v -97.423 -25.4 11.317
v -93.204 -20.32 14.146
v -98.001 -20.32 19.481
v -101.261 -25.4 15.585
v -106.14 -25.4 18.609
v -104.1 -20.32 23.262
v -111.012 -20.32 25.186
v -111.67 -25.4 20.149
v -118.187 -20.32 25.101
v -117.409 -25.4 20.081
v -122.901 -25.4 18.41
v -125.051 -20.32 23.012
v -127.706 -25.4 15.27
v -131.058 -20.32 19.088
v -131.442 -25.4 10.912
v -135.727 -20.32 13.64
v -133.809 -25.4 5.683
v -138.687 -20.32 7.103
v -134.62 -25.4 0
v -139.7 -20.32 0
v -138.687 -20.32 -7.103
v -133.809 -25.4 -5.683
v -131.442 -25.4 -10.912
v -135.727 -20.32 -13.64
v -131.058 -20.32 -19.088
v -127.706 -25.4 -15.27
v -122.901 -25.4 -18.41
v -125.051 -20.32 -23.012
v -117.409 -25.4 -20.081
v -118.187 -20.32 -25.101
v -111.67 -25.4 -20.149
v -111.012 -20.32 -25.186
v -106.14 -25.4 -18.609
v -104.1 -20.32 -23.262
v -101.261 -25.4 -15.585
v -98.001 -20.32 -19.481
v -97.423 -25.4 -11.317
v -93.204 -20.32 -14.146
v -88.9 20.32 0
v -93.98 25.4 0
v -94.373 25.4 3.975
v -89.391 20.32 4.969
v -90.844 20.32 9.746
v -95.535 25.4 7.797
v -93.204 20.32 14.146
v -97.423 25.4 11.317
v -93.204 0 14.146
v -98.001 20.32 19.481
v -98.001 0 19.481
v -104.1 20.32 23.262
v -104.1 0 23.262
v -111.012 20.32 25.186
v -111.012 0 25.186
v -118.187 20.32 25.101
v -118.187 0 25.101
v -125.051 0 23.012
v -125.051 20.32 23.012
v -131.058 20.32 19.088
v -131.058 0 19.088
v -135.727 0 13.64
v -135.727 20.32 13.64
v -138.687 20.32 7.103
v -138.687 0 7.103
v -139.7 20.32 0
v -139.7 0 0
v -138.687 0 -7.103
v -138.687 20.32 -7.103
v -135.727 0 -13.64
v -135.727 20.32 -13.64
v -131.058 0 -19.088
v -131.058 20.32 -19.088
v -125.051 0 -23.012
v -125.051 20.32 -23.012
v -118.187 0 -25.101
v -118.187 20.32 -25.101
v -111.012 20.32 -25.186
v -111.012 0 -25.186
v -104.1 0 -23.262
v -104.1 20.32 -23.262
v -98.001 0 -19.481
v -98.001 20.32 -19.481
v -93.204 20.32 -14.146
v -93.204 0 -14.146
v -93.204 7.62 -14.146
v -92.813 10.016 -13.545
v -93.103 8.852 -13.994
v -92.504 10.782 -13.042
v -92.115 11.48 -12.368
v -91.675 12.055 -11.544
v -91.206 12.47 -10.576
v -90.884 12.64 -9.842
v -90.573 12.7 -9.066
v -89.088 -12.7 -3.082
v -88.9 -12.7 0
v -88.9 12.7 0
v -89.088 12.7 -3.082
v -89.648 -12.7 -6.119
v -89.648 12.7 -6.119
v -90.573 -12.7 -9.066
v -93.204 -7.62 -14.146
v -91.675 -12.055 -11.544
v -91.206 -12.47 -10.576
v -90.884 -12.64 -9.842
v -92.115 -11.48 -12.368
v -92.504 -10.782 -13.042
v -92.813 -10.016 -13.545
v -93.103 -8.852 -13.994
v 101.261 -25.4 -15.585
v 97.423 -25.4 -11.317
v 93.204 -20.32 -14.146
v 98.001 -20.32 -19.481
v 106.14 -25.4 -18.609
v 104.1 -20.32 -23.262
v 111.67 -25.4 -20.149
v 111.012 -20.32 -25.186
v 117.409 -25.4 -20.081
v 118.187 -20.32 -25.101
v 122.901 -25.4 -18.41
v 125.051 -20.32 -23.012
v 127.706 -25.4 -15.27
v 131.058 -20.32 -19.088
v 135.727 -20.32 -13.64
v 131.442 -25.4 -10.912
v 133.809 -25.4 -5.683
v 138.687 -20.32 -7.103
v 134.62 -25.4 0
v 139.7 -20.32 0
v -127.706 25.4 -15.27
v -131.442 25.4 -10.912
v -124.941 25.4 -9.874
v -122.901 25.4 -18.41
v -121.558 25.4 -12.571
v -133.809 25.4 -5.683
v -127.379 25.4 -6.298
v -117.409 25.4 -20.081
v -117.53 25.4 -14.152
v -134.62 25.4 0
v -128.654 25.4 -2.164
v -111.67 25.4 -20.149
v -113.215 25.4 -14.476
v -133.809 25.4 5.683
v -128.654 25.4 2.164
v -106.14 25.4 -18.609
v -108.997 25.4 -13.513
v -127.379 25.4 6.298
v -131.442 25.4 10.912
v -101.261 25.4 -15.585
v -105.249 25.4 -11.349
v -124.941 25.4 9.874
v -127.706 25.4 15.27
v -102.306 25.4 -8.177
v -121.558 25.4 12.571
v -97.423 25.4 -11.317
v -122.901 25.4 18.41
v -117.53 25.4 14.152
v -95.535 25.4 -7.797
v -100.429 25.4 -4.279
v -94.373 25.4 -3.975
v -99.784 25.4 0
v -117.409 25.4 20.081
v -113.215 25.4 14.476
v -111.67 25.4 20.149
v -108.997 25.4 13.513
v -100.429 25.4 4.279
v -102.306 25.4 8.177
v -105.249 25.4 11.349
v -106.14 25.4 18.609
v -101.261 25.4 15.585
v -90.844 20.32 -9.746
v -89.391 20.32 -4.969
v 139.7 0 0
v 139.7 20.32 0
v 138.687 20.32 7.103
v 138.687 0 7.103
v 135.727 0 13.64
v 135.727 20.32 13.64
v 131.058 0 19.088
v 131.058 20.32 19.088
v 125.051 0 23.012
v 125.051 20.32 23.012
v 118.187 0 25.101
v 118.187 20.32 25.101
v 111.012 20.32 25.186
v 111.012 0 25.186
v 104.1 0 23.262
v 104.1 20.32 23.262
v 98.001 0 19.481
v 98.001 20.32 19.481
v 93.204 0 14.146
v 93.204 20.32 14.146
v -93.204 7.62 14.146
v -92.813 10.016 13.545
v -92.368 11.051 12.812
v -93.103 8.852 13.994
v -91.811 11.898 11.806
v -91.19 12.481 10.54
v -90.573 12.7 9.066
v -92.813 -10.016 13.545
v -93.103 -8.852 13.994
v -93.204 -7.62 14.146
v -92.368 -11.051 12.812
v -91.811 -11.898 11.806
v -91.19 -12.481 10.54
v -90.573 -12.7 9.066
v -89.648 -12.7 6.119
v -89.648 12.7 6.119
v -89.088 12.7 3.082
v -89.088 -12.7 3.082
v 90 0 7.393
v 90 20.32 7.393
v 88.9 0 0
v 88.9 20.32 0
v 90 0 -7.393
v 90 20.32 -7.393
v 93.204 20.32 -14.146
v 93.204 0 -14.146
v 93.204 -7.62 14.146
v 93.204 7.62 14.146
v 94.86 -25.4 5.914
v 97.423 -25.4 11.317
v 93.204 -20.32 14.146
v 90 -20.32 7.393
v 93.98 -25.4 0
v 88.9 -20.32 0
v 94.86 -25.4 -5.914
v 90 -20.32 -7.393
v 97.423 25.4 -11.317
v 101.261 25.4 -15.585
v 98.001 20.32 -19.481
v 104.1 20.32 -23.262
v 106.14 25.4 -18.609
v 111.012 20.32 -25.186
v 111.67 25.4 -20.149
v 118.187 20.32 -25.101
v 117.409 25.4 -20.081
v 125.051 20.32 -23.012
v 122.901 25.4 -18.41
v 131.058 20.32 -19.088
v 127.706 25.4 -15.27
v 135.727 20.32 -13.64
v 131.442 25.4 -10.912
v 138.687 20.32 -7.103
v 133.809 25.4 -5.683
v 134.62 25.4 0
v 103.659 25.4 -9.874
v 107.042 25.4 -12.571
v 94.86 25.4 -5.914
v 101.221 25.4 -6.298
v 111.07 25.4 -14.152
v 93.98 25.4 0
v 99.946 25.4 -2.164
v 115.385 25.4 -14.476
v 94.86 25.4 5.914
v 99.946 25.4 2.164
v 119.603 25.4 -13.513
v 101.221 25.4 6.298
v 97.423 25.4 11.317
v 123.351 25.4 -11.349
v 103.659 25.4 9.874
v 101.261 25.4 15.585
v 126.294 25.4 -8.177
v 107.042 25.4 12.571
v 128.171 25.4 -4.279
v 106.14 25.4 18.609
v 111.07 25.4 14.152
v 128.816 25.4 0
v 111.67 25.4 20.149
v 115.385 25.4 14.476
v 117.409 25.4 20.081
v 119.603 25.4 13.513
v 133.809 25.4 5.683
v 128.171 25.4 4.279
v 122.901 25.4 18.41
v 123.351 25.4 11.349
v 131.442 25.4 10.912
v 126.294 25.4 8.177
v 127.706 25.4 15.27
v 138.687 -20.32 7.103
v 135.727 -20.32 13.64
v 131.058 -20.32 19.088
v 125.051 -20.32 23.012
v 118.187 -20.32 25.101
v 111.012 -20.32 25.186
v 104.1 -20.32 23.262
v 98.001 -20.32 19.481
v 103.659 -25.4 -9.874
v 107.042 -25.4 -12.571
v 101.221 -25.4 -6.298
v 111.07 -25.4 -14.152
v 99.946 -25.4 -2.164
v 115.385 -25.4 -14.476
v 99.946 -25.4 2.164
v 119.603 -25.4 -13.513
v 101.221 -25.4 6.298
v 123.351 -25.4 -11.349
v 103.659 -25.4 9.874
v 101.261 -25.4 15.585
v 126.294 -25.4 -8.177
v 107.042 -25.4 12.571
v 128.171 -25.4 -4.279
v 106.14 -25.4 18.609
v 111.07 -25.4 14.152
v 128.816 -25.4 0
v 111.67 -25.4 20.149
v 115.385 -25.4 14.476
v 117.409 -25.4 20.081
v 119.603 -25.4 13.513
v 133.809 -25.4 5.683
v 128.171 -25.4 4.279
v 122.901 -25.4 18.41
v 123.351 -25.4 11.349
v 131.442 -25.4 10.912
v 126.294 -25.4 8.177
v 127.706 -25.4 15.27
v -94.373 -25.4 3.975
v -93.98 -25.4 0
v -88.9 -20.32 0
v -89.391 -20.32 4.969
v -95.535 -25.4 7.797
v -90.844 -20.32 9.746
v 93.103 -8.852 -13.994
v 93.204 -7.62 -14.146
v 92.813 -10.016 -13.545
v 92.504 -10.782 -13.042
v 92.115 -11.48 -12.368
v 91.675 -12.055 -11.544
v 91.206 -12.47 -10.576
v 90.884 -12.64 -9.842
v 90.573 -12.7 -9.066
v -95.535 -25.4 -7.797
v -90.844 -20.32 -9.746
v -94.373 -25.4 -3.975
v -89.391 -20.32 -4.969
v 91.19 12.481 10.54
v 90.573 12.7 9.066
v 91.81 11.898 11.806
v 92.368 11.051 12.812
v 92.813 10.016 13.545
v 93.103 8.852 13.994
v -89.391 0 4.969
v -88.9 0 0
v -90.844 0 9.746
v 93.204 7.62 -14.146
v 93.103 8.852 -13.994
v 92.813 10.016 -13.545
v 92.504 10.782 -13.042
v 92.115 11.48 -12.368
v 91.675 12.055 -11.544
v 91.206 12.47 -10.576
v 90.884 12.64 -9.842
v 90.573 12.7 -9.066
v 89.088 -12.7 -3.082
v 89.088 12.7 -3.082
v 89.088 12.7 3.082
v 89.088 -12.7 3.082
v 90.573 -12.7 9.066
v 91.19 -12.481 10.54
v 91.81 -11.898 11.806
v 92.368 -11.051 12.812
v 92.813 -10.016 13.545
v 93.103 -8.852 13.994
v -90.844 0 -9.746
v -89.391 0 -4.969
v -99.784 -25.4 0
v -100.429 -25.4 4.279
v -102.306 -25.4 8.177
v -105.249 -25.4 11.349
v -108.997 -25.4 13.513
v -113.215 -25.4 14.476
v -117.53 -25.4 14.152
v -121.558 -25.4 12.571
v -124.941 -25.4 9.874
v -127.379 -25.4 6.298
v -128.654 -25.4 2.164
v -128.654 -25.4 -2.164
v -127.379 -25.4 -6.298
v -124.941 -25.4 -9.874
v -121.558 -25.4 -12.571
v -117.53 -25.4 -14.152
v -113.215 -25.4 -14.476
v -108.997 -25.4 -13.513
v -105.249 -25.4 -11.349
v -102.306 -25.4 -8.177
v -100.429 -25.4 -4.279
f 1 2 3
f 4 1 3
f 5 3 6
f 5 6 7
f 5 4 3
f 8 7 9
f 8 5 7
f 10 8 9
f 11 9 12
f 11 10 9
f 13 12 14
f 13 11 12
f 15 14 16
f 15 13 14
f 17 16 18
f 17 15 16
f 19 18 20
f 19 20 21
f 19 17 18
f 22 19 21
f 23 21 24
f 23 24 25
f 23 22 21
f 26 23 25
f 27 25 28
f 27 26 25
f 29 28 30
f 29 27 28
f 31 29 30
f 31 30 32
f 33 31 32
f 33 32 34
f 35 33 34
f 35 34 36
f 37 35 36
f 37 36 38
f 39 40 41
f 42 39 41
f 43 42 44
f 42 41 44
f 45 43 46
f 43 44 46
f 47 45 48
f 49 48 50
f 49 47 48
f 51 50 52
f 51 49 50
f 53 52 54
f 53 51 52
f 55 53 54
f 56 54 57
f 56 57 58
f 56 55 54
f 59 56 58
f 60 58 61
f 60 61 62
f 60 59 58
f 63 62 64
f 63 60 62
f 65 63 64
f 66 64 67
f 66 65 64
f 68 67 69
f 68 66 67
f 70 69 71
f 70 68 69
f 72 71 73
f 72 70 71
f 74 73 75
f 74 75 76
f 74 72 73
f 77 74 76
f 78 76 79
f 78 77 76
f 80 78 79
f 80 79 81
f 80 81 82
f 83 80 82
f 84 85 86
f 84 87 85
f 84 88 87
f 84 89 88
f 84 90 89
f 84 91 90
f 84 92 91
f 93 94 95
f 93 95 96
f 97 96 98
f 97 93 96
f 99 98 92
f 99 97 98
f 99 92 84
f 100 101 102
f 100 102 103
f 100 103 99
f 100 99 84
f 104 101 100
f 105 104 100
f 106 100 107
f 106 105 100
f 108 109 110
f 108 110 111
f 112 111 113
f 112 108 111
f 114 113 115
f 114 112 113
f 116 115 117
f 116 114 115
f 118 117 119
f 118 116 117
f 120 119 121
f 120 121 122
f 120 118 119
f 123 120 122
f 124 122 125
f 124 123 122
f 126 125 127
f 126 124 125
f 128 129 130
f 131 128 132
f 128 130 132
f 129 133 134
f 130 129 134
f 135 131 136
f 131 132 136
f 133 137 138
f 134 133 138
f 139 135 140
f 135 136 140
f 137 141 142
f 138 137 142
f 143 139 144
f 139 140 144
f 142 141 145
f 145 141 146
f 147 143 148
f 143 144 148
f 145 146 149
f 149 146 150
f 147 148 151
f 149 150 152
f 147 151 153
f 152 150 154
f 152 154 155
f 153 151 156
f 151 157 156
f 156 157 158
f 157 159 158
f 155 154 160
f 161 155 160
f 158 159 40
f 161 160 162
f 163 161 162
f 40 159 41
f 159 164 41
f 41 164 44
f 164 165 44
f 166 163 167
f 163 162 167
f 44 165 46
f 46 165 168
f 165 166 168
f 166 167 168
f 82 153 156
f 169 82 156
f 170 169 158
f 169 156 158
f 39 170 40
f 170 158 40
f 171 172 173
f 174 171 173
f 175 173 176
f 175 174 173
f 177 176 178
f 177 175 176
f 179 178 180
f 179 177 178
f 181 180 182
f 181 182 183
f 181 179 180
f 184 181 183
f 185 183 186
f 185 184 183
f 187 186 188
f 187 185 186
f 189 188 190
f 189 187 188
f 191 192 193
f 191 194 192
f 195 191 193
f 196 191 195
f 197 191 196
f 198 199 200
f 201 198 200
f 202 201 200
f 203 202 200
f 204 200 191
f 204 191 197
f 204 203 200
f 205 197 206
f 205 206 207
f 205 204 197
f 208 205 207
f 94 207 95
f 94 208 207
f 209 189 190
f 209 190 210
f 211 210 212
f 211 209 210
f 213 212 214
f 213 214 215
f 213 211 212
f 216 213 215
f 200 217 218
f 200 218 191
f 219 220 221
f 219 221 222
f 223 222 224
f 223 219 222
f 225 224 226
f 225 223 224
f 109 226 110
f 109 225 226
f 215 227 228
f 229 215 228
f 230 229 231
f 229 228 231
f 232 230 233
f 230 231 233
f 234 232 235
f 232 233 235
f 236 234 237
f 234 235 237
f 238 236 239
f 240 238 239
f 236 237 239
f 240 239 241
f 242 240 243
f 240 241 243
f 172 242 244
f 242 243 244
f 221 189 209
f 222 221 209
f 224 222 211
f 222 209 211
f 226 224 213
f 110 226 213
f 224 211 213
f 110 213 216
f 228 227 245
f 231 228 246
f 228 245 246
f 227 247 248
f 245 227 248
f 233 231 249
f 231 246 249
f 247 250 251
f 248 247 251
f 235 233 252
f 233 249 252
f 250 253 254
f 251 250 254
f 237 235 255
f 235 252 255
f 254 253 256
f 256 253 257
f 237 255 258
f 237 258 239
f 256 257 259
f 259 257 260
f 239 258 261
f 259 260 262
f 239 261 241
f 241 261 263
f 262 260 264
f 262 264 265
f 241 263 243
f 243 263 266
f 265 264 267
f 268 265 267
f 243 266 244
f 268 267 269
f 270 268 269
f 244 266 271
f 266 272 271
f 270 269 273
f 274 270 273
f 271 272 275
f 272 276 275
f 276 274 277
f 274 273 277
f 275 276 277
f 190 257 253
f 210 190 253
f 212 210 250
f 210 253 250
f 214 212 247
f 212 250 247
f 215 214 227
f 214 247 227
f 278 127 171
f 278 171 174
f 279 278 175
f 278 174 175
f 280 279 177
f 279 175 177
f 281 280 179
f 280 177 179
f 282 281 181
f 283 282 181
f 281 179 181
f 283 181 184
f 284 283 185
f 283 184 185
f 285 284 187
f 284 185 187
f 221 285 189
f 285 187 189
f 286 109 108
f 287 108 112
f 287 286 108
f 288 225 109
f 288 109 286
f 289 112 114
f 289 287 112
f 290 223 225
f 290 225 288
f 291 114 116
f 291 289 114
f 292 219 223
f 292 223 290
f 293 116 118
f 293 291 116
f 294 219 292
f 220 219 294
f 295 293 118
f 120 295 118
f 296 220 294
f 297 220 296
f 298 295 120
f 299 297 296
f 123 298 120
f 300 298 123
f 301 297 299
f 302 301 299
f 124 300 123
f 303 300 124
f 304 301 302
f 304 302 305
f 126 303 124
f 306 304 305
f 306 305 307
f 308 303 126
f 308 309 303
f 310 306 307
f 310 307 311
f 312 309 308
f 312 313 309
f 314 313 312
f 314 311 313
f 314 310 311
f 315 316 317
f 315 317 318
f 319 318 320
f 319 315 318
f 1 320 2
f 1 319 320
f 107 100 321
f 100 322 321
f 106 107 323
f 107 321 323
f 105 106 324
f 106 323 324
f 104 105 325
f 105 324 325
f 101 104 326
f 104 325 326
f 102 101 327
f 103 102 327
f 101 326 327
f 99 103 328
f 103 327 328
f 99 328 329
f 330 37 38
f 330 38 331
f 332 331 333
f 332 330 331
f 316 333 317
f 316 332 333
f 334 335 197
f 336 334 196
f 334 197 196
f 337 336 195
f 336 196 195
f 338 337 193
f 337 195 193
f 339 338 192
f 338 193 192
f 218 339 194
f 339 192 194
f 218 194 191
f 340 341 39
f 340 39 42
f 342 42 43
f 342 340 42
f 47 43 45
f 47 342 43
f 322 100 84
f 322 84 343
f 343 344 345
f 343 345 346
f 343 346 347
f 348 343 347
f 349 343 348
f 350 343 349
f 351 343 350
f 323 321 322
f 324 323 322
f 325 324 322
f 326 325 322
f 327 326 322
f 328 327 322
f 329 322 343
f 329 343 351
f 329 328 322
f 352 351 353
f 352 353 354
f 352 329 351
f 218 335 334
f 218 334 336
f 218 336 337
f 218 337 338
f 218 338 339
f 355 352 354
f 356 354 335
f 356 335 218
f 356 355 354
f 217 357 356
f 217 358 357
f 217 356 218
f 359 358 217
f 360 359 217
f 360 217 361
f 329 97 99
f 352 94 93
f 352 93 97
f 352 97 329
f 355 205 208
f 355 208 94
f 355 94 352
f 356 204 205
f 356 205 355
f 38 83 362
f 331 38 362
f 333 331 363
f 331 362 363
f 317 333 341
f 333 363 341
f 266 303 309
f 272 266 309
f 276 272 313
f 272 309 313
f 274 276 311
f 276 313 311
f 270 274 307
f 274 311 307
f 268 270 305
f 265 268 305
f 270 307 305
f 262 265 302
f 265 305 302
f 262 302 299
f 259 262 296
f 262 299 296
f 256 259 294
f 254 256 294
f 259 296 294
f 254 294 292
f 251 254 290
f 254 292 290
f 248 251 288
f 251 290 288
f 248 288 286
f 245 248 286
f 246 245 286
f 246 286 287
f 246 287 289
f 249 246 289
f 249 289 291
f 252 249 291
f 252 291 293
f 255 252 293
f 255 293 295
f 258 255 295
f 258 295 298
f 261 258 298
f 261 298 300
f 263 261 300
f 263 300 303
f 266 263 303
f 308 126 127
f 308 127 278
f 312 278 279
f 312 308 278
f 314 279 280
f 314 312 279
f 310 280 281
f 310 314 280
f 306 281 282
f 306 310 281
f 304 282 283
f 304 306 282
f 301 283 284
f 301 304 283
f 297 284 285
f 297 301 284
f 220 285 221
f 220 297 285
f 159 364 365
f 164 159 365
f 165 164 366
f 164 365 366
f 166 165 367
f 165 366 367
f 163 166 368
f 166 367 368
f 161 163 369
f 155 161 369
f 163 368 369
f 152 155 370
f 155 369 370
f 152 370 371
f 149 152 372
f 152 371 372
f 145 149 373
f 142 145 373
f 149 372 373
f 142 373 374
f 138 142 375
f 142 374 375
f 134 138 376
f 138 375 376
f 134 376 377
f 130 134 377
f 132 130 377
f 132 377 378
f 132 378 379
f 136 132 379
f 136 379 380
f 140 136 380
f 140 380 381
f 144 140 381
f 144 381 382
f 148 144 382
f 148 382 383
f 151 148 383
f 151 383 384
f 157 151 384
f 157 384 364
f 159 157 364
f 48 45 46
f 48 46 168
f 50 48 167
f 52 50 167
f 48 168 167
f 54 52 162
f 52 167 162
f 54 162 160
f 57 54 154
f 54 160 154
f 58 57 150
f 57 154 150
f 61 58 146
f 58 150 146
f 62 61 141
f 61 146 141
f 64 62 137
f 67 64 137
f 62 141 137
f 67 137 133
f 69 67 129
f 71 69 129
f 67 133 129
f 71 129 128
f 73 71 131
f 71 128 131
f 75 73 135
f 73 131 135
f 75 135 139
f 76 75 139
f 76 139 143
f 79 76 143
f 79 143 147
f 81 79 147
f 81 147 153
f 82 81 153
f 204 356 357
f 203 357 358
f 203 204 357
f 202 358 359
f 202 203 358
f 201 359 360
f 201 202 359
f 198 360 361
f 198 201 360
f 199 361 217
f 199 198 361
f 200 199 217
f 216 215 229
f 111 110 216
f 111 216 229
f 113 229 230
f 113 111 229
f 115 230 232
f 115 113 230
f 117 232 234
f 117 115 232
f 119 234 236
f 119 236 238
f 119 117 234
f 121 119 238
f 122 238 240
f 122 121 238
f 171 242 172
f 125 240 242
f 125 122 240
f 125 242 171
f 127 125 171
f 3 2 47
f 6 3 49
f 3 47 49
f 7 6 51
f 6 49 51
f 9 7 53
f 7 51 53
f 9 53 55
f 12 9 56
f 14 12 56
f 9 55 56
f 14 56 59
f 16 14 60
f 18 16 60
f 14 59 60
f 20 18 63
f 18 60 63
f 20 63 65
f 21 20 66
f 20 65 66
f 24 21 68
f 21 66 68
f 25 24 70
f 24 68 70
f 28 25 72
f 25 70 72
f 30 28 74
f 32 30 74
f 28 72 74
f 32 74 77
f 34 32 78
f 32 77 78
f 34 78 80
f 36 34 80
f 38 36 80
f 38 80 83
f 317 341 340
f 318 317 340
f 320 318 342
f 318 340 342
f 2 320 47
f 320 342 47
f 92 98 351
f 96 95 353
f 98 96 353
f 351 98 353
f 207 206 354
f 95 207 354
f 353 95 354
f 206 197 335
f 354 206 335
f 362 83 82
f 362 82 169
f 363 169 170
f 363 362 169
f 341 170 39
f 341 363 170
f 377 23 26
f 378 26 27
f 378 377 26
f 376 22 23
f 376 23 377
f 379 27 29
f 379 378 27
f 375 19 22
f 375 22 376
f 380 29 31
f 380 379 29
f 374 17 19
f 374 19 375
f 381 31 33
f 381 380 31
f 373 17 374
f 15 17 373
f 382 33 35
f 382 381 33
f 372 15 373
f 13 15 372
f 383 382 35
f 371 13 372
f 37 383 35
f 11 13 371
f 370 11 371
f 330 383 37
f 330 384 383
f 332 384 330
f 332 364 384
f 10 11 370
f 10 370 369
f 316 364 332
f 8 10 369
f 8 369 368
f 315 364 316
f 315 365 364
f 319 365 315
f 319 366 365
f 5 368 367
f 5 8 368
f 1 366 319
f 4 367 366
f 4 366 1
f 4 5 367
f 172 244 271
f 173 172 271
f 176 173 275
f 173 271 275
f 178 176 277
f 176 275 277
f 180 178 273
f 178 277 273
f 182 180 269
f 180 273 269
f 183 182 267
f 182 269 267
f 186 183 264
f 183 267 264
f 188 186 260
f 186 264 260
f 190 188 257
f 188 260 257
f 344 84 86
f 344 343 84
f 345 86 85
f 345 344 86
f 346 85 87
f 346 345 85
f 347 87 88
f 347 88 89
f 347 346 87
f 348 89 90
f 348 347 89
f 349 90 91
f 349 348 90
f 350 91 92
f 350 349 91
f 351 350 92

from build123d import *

# Parameters (mm, degrees)
F1_DEPTH      = 12.7
F1_DEPTH_BACK = 12.7
F2_DEPTH      = 25.4
F2_DEPTH_BACK = 25.4
F3_DEPTH      = 25.4
F3_DEPTH_BACK = 25.4
F4_R          = 14.5162780277
F5_DEPTH      = 50.801
F6_R          = 14.5162780277
F7_DEPTH      = 50.801
F8_SIZE       = 5.08
F8_2_SIZE     = 5.08
F9_R          = 5.08


with BuildPart() as f1:
    # F0 (on Front) → F1 (new body, two sides)
    with BuildSketch(Plane.XZ) as f1_sk:
        with BuildLine():
            ThreePointArc((-88.9, 0), (-89.9997339516, -7.3930419976), (-93.2037062975, -14.1458966494))
            Line((-93.2037062975, -14.1458966494), (93.2037062975, -14.1458966494))
            ThreePointArc((93.2037062975, -14.1458966494), (88.9, 0), (93.2037062975, 14.1458966494))
            Line((93.2037062975, 14.1458966494), (-93.2037062975, 14.1458966494))
            ThreePointArc((-93.2037062975, 14.1458966494), (-89.9997339516, 7.3930419976), (-88.9, 0))
        make_face()
    extrude(amount=F1_DEPTH)
    extrude(f1_sk.sketch, amount=-F1_DEPTH_BACK)

    # F9
    f9_edges = [f1.edges().sort_by_distance(p)[0] for p in [
        (0, -12.7, 14.145897),
        (0, 12.7, 14.145897),
        (0, -12.7, -14.145897),
        (0, 12.7, -14.145897),
    ]]
    fillet(f9_edges, radius=F9_R)


with BuildPart() as f2:
    # F0 (on Front) → F2 (new body, two sides)
    with BuildSketch(Plane.XZ) as f2_sk:
        with BuildLine():
            Line((-93.2037062975, -14.1458966494), (-114.3, -14.1458966494))
            Line((-114.3, -14.1458966494), (-114.3, 14.1458966494))
            Line((-114.3, 14.1458966494), (-93.2037062975, 14.1458966494))
            ThreePointArc((-93.2037062975, 14.1458966494), (-139.7, 0), (-93.2037062975, -14.1458966494))
        make_face()
        with BuildLine():
            Line((-114.3, 14.1458966494), (-114.3, -14.1458966494))
            Line((-114.3, -14.1458966494), (-93.2037062975, -14.1458966494))
            ThreePointArc((-93.2037062975, -14.1458966494), (-89.9997339516, -7.3930419976), (-88.9, 0))
            ThreePointArc((-88.9, 0), (-89.9997339516, 7.3930419976), (-93.2037062975, 14.1458966494))
            Line((-93.2037062975, 14.1458966494), (-114.3, 14.1458966494))
        make_face()
    extrude(amount=F2_DEPTH)
    extrude(f2_sk.sketch, amount=-F2_DEPTH_BACK)

    # F4 (on face) → F5 (cut, through all)
    with BuildSketch(Plane.XZ.offset(25.4)):
        with Locations((-114.3, 0)):
            Circle(F4_R)
    extrude(amount=-F5_DEPTH, mode=Mode.SUBTRACT)

    # F8
    f8_edges = [f2.edges().sort_by_distance(p)[0] for p in [
        (-135.396294, -25.4, 14.145897),
        (-135.396294, 25.4, 14.145897),
    ]]
    chamfer(f8_edges, length=F8_SIZE)


with BuildPart() as f3:
    # F0 (on Front) → F3 (new body, two sides)
    with BuildSketch(Plane.XZ) as f3_sk:
        with BuildLine():
            Line((114.3, -14.1458966494), (93.2037062975, -14.1458966494))
            ThreePointArc((93.2037062975, -14.1458966494), (121.6930419976, -24.3002660484), (139.7, 0))
            ThreePointArc((139.7, 0), (121.6930419976, 24.3002660484), (93.2037062975, 14.1458966494))
            Line((93.2037062975, 14.1458966494), (114.3, 14.1458966494))
            Line((114.3, 14.1458966494), (114.3, -14.1458966494))
        make_face()
        with BuildLine():
            ThreePointArc((93.2037062975, 14.1458966494), (88.9, 0), (93.2037062975, -14.1458966494))
            Line((93.2037062975, -14.1458966494), (114.3, -14.1458966494))
            Line((114.3, -14.1458966494), (114.3, 14.1458966494))
            Line((114.3, 14.1458966494), (93.2037062975, 14.1458966494))
        make_face()
    extrude(amount=F3_DEPTH)
    extrude(f3_sk.sketch, amount=-F3_DEPTH_BACK)

    # F6 (on face) → F7 (cut, through all)
    with BuildSketch(Plane.XZ.offset(25.4)):
        with Locations((114.3, 0)):
            Circle(F6_R)
    extrude(amount=-F7_DEPTH, mode=Mode.SUBTRACT)

    # F8#2
    f8_2_edges = [f3.edges().sort_by_distance(p)[0] for p in [
        (88.9, -25.4, 0),
        (88.9, 25.4, 0),
    ]]
    chamfer(f8_2_edges, length=F8_2_SIZE)


solid = Compound([f1.part, f2.part, f3.part])
